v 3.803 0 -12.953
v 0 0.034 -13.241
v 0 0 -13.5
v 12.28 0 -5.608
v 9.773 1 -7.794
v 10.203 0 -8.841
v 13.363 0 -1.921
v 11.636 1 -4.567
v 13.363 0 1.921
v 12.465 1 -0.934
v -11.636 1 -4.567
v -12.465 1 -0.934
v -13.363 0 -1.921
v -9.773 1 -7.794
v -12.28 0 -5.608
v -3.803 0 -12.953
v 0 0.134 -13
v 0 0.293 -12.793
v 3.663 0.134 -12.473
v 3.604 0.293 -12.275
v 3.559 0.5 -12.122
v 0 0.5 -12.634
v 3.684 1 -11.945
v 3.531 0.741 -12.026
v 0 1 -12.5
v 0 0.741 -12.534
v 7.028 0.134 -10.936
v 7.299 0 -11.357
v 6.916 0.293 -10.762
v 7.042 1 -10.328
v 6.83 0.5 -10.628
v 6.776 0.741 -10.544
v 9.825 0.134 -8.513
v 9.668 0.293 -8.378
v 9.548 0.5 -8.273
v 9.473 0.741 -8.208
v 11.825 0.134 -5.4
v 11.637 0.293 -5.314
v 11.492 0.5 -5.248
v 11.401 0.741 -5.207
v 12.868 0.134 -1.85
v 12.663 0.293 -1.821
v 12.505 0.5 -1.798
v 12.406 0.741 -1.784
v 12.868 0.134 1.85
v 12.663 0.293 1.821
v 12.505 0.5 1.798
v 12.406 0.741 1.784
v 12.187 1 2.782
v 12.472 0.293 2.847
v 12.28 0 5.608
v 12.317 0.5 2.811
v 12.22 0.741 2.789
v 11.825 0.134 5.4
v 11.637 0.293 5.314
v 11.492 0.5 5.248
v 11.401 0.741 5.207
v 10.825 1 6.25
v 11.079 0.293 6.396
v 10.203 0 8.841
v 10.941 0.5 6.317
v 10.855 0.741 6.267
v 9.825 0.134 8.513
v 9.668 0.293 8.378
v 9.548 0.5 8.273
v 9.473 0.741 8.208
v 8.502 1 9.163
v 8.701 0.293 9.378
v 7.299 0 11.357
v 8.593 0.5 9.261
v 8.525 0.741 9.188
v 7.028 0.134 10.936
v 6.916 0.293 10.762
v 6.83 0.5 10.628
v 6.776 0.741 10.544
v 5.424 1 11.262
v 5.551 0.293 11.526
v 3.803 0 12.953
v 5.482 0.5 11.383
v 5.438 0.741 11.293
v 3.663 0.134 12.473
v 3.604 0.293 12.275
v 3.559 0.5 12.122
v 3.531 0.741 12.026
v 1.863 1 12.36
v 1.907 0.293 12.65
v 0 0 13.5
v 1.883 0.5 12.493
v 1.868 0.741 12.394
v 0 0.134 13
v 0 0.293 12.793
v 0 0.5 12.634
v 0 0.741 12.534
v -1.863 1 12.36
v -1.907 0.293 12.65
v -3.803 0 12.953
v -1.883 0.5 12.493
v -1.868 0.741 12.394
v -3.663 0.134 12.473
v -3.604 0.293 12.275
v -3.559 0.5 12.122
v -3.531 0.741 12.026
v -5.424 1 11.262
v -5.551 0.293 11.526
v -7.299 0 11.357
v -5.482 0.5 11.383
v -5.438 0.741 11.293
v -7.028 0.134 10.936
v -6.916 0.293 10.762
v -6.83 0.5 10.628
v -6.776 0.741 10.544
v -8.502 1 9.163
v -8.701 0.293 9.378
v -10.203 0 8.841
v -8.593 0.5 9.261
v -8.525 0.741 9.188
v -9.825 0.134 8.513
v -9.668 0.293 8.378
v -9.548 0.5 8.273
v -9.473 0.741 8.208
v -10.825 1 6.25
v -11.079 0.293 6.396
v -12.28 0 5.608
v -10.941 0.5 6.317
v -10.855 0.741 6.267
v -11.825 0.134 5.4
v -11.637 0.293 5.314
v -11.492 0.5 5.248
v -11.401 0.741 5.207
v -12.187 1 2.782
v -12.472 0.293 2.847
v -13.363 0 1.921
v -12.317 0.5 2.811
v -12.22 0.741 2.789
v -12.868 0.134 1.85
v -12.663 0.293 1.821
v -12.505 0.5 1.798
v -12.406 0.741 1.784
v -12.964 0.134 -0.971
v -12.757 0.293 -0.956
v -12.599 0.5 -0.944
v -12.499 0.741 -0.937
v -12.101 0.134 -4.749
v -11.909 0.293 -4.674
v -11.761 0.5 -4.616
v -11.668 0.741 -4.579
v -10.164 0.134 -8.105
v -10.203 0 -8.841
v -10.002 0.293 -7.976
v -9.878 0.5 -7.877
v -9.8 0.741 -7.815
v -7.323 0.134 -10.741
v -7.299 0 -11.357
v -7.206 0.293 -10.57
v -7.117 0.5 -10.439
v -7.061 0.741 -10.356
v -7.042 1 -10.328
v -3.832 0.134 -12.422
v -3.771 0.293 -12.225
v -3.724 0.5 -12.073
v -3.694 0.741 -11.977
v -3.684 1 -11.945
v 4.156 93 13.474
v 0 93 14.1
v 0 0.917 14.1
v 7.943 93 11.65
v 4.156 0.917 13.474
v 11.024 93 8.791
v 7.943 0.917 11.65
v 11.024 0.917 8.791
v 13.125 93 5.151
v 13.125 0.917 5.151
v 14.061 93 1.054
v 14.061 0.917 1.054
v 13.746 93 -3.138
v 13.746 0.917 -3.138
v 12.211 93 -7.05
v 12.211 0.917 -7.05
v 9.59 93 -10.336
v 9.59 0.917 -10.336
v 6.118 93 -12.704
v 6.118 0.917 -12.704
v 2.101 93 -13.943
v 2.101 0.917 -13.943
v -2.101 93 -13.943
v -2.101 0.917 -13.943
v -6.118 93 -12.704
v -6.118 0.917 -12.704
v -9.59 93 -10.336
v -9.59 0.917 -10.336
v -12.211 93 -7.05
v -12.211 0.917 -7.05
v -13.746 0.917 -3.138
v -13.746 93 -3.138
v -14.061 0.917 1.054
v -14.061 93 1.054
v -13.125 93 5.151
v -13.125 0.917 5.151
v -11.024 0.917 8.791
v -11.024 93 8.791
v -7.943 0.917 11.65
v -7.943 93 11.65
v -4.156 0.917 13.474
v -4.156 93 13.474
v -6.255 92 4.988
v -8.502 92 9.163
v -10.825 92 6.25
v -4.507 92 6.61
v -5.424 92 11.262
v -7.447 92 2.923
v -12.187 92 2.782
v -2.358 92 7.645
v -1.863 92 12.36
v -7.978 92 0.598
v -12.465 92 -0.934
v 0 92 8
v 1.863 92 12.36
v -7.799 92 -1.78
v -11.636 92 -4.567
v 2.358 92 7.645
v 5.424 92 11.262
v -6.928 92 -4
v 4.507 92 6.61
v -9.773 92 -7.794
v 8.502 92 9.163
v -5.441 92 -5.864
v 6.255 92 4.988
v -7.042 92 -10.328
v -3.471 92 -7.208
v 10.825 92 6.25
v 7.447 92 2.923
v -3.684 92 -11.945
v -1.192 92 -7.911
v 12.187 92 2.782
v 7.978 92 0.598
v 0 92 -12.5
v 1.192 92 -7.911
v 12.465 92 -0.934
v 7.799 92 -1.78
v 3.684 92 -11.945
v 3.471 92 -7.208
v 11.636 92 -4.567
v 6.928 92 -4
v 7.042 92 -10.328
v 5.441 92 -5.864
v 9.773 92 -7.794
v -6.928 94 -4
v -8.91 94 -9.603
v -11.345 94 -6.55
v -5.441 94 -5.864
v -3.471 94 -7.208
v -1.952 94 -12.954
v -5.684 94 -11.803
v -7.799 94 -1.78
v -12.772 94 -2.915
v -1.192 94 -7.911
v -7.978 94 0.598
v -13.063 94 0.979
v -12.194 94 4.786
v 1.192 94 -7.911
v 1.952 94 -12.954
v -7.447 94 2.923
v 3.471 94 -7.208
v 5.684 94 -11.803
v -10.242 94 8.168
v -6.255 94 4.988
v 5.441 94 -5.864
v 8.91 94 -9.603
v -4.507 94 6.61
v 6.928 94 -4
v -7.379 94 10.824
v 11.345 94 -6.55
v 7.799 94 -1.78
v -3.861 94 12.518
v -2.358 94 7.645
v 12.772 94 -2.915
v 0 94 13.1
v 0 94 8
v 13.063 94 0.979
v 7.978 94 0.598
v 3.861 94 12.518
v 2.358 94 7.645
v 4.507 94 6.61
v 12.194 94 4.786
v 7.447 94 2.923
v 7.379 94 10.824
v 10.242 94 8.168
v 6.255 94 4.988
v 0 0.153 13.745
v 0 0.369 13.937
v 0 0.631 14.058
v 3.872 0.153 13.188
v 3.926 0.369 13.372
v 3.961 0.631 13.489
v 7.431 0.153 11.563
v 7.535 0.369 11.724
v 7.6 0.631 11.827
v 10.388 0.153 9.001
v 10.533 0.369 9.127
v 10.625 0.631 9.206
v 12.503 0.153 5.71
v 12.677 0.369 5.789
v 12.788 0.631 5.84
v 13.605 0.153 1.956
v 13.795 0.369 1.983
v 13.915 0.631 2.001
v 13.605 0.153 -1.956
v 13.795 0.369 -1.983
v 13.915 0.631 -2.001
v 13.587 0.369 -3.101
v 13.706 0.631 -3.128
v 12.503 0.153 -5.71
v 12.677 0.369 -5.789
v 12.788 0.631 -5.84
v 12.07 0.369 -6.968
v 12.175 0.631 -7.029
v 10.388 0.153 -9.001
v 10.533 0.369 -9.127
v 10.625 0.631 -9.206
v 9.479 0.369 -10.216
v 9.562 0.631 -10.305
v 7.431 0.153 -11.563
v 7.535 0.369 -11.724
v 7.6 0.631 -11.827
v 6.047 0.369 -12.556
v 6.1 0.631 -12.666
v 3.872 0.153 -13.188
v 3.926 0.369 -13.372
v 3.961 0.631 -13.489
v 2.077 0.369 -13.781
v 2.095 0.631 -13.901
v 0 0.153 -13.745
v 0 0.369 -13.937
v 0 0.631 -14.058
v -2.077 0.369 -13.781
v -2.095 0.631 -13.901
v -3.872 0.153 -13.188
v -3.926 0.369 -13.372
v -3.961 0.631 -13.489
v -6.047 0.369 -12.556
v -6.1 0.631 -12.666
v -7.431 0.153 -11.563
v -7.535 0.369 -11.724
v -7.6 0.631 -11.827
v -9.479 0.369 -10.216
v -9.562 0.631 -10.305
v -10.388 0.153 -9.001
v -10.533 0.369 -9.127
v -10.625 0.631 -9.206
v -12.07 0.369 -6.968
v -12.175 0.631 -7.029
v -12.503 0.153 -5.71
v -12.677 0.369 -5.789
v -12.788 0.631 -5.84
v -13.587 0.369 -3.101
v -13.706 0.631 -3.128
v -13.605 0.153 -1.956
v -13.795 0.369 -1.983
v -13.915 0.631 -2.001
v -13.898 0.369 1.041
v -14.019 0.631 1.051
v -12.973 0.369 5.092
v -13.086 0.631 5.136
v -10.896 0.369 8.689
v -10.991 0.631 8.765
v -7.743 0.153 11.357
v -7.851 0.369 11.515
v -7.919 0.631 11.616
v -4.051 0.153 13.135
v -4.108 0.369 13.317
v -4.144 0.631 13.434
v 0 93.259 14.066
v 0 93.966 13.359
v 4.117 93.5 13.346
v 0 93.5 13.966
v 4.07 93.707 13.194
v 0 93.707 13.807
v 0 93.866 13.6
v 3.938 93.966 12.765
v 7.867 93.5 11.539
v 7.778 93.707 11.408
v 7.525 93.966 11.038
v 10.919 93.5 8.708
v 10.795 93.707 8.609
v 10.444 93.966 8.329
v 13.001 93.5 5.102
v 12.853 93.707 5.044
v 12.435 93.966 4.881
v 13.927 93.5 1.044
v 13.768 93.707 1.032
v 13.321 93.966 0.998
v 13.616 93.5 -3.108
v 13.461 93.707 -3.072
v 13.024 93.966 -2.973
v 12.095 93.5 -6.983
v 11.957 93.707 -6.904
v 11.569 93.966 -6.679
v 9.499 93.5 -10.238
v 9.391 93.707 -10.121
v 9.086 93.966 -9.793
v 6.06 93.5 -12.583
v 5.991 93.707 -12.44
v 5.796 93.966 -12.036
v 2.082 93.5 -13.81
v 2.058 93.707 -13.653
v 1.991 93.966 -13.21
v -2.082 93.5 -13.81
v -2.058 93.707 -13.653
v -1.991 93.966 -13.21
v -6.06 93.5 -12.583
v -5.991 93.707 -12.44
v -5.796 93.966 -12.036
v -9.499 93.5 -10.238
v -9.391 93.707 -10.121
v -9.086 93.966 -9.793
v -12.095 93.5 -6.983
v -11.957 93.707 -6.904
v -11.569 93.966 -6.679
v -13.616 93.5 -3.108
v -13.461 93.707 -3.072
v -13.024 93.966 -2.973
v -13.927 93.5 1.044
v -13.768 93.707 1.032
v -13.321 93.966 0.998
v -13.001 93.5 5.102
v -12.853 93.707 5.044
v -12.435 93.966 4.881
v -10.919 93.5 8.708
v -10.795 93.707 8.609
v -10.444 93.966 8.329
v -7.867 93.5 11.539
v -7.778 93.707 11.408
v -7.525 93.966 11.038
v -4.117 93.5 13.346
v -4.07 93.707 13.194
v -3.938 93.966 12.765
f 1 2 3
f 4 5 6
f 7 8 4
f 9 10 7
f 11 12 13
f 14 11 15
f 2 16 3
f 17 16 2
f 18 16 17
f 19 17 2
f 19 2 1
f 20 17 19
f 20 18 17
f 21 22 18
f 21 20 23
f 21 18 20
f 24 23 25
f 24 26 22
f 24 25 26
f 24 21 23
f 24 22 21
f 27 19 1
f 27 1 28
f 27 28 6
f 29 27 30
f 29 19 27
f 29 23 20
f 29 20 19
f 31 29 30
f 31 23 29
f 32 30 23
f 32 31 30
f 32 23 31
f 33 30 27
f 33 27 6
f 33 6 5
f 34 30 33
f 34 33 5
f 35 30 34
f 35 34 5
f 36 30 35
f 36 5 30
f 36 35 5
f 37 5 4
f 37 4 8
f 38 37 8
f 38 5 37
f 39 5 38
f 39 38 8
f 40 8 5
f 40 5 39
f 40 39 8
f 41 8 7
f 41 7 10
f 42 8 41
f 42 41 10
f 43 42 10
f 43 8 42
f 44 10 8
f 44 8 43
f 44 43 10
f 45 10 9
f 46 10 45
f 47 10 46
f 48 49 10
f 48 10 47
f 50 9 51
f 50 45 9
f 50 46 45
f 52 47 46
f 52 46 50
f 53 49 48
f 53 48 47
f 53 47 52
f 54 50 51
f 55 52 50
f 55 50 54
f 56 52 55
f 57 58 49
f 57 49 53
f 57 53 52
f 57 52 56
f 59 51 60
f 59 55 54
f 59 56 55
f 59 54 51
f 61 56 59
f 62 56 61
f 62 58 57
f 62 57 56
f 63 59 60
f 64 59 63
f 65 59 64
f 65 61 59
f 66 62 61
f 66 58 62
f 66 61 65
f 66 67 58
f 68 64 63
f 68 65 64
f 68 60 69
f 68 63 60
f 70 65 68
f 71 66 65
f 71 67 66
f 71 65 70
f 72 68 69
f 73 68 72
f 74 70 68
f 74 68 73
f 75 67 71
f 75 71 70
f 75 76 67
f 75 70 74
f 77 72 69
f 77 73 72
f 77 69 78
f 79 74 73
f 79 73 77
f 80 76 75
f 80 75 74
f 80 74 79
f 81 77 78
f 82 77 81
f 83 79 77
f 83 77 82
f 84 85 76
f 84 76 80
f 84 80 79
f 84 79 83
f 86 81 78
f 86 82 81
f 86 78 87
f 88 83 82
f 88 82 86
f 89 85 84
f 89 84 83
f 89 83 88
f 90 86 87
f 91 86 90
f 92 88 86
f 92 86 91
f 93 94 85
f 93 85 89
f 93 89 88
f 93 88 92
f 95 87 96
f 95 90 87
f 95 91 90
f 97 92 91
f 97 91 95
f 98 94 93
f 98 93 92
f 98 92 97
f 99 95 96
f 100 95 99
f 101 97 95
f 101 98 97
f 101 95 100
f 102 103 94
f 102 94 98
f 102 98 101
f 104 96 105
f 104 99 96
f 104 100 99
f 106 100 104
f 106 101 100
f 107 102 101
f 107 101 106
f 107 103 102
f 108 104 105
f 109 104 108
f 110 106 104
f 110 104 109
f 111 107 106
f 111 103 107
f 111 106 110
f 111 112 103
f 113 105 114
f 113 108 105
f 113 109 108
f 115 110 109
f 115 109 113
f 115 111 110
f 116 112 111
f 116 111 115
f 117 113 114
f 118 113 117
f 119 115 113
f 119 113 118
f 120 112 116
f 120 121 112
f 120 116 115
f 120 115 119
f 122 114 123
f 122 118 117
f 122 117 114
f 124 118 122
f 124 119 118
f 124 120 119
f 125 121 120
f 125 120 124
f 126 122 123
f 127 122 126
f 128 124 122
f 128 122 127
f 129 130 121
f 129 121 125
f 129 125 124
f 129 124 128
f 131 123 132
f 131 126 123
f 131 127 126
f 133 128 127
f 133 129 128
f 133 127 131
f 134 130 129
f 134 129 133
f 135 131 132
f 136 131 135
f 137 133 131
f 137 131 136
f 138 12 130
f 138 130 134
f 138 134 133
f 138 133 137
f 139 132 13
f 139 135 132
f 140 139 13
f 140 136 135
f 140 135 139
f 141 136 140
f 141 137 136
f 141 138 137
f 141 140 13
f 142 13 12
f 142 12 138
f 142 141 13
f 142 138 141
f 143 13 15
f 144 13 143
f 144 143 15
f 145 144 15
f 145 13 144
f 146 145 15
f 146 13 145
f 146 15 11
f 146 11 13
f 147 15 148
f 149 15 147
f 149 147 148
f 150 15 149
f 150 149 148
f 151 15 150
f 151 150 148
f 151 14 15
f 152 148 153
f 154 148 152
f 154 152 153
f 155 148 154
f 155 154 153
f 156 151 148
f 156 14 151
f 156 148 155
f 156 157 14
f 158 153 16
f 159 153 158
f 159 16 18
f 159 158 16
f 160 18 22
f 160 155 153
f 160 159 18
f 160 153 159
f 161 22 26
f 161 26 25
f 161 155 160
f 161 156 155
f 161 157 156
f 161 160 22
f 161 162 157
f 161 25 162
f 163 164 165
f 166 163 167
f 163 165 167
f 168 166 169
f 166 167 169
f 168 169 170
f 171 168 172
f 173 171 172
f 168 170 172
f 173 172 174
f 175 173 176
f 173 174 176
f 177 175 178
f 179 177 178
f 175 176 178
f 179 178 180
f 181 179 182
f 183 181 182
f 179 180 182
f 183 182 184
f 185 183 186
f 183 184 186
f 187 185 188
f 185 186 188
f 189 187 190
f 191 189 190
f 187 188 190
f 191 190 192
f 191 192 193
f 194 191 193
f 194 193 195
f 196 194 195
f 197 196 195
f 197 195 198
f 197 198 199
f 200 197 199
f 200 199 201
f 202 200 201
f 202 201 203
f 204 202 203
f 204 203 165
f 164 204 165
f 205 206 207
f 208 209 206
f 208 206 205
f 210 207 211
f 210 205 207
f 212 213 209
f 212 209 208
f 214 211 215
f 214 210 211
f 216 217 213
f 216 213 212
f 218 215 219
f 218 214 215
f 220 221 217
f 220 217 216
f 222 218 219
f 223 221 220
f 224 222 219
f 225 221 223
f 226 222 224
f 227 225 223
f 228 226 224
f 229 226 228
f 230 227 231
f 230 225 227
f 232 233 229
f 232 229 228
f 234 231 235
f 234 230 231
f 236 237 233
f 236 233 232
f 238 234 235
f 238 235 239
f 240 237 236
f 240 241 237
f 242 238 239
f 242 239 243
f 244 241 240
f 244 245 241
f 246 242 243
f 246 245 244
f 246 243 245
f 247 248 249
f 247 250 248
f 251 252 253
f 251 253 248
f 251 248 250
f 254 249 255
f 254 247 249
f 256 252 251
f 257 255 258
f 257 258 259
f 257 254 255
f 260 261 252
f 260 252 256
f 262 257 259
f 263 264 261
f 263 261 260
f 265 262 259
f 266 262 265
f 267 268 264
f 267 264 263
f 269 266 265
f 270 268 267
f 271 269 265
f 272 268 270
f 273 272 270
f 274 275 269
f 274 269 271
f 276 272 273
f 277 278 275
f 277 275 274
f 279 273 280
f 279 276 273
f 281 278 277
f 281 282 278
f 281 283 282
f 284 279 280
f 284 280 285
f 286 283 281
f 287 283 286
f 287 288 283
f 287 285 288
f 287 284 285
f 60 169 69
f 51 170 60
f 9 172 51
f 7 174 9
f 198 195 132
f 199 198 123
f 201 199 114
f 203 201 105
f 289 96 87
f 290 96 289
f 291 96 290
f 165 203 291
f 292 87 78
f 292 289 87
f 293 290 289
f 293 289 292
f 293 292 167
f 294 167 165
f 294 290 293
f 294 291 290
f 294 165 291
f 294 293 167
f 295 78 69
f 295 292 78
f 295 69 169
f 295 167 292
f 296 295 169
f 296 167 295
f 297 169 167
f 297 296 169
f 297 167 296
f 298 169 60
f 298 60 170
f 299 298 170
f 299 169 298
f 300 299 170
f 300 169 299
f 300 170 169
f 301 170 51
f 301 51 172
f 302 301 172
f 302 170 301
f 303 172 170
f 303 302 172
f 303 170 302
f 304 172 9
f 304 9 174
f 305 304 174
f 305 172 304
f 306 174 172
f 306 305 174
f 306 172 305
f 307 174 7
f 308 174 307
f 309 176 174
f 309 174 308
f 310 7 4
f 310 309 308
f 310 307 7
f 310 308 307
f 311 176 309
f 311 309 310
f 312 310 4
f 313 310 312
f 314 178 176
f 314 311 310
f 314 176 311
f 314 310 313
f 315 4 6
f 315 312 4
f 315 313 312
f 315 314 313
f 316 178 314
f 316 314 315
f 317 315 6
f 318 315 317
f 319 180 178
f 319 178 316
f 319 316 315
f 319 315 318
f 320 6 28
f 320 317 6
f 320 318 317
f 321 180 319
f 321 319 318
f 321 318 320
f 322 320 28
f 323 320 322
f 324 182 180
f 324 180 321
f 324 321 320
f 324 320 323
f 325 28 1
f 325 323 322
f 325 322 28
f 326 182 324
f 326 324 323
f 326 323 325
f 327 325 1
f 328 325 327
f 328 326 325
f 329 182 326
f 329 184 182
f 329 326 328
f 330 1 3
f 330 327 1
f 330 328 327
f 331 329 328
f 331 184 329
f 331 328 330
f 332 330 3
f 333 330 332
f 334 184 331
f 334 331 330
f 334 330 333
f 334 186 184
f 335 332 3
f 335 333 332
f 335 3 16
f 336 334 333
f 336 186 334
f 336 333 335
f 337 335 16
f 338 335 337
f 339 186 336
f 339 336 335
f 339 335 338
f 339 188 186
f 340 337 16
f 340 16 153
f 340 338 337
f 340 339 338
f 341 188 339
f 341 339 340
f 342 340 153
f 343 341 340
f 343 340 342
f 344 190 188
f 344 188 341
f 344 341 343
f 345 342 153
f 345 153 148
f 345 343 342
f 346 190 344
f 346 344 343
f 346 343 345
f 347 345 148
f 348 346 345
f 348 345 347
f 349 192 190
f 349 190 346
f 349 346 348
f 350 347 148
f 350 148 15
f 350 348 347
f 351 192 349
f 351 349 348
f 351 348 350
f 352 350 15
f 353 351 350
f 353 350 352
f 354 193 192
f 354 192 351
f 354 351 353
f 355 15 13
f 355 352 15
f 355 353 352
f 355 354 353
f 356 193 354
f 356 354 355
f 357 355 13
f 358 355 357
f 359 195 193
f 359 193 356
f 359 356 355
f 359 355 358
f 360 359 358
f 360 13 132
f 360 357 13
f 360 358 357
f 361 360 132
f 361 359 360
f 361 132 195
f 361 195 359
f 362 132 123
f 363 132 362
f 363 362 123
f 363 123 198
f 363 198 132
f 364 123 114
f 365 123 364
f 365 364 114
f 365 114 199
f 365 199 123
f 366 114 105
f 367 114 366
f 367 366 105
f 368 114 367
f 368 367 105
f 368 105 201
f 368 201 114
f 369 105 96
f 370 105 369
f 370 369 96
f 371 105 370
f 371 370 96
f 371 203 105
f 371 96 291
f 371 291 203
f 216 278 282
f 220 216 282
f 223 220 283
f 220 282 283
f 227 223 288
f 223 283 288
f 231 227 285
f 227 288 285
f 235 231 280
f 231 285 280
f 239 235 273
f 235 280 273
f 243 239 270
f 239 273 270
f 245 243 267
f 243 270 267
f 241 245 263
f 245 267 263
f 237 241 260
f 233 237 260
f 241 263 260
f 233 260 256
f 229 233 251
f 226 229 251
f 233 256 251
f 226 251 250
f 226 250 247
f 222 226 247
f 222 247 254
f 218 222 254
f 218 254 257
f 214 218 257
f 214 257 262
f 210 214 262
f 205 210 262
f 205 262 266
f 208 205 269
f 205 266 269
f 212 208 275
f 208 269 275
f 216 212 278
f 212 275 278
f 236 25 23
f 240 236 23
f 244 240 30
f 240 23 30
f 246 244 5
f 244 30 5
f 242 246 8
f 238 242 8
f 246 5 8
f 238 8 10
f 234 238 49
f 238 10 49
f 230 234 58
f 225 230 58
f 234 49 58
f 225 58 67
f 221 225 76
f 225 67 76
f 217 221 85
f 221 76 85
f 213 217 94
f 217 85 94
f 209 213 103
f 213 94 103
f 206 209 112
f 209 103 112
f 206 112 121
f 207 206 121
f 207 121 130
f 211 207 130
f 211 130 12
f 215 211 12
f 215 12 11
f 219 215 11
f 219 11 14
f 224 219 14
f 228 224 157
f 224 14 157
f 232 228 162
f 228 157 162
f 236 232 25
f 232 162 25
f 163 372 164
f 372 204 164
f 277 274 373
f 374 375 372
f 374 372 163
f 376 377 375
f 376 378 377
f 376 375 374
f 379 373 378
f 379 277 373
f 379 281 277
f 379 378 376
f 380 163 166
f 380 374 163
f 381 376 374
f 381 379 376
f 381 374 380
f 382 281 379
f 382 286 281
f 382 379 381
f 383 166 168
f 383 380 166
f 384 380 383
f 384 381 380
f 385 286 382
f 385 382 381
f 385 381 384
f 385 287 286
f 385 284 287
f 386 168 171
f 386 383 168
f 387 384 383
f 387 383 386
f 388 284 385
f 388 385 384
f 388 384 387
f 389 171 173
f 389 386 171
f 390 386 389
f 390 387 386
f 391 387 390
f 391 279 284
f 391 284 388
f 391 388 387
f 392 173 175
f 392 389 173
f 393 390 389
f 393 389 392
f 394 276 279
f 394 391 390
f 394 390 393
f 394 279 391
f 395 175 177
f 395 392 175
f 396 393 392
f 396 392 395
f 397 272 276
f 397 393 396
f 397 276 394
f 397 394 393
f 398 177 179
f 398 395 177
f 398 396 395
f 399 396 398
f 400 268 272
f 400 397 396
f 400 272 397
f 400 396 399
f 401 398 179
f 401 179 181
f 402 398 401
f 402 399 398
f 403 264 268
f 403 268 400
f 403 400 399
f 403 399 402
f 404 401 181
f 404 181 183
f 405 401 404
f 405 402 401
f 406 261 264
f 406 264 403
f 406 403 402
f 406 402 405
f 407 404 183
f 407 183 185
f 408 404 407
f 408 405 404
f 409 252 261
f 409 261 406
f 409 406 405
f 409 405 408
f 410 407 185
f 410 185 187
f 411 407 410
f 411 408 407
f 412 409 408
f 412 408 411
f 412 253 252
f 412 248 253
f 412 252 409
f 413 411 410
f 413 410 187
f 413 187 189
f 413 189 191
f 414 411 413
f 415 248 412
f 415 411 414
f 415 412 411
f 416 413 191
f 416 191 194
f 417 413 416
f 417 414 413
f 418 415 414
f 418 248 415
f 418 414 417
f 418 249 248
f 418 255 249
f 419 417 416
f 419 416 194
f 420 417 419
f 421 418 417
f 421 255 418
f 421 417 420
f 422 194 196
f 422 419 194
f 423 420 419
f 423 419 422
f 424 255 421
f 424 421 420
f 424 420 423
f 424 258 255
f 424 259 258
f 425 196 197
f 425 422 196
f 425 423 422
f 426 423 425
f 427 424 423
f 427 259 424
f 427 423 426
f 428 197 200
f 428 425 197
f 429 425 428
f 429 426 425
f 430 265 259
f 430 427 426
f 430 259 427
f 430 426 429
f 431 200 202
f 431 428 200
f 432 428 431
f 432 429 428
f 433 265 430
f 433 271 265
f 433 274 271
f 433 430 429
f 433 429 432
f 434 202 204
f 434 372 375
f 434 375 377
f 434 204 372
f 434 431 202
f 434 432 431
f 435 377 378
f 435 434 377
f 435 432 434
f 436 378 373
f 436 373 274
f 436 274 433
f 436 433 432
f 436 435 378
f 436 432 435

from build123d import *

# Parameters (mm, degrees)
SKETCH_1_R          = 14.1
EXTRUDE_1_DEPTH     = 94
SKETCH_2_R          = 12.5
CUT_EXTRUDE_1_DEPTH = 92
FILLET_2_R          = 1
FILLET_3_R          = 1
FILLET_4_R          = 1
SKETCH_3_R          = 8
CUT_EXTRUDE_2_DEPTH = 2


with BuildPart() as part:
    # Эскиз1 → Бобышка-Вытянуть1 (new body)
    with BuildSketch(Plane(origin=(0, 0, 0), x_dir=(1, 0, 0), z_dir=(0, 1, 0))):
        with Locations(Location((0, 0, 0), (0, 0, 270))):
            Circle(SKETCH_1_R)
    extrude(amount=EXTRUDE_1_DEPTH)

    # Эскиз2 → Вырез-Вытянуть1 (cut)
    with BuildSketch(Plane.XZ):
        with Locations(Location((0, 0, 0), (0, 0, 270))):
            Circle(SKETCH_2_R)
    extrude(amount=-CUT_EXTRUDE_1_DEPTH, mode=Mode.SUBTRACT)

    # Скругление2
    fillet_2_edges = [part.edges().sort_by_distance(p)[0] for p in [
        (0, 0, 12.5),
    ]]
    fillet(fillet_2_edges, radius=FILLET_2_R)

    # Скругление3
    # the kernel refuses this fillet: 1 mm, written as the material it takes off along each edge
    with BuildSketch(Plane(origin=(0, 0, 0), x_dir=(0, 0, 1), z_dir=(-1, 0, 0))) as fillet_3_piece_1:
        with BuildLine():
            CenterArc((13.1, 0.916515139), FILLET_3_R, 293.578178478, 66.421821522)
            Line((14.1, 0.916515139), (14.12, 0.916515139))
            Line((14.12, 0.916515139), (14.12, 0))
            Line((14.12, 0), (14.1, -0.02))
            ThreePointArc((14.1, -0.02), (13.8, -0.02), (13.508, -0.018330303))
            Line((13.508, -0.018330303), (13.5, 0))
        make_face()
    revolve(axis=Axis((0, 0, 0), (0, 1, 0)), mode=Mode.SUBTRACT)

    # Скругление4
    fillet_4_edges = [part.edges().sort_by_distance(p)[0] for p in [
        (0, 94, -14.1),
    ]]
    fillet(fillet_4_edges, radius=FILLET_4_R)

    # Эскиз3 → Вырез-Вытянуть2 (cut)
    with BuildSketch(Plane(origin=(0, 94, 0), x_dir=(1, 0, 0), z_dir=(0, 1, 0))):
        with Locations(Location((0, 0, 0), (0, 0, 270))):
            Circle(SKETCH_3_R)
    extrude(amount=-CUT_EXTRUDE_2_DEPTH, mode=Mode.SUBTRACT)


solid = part.part
